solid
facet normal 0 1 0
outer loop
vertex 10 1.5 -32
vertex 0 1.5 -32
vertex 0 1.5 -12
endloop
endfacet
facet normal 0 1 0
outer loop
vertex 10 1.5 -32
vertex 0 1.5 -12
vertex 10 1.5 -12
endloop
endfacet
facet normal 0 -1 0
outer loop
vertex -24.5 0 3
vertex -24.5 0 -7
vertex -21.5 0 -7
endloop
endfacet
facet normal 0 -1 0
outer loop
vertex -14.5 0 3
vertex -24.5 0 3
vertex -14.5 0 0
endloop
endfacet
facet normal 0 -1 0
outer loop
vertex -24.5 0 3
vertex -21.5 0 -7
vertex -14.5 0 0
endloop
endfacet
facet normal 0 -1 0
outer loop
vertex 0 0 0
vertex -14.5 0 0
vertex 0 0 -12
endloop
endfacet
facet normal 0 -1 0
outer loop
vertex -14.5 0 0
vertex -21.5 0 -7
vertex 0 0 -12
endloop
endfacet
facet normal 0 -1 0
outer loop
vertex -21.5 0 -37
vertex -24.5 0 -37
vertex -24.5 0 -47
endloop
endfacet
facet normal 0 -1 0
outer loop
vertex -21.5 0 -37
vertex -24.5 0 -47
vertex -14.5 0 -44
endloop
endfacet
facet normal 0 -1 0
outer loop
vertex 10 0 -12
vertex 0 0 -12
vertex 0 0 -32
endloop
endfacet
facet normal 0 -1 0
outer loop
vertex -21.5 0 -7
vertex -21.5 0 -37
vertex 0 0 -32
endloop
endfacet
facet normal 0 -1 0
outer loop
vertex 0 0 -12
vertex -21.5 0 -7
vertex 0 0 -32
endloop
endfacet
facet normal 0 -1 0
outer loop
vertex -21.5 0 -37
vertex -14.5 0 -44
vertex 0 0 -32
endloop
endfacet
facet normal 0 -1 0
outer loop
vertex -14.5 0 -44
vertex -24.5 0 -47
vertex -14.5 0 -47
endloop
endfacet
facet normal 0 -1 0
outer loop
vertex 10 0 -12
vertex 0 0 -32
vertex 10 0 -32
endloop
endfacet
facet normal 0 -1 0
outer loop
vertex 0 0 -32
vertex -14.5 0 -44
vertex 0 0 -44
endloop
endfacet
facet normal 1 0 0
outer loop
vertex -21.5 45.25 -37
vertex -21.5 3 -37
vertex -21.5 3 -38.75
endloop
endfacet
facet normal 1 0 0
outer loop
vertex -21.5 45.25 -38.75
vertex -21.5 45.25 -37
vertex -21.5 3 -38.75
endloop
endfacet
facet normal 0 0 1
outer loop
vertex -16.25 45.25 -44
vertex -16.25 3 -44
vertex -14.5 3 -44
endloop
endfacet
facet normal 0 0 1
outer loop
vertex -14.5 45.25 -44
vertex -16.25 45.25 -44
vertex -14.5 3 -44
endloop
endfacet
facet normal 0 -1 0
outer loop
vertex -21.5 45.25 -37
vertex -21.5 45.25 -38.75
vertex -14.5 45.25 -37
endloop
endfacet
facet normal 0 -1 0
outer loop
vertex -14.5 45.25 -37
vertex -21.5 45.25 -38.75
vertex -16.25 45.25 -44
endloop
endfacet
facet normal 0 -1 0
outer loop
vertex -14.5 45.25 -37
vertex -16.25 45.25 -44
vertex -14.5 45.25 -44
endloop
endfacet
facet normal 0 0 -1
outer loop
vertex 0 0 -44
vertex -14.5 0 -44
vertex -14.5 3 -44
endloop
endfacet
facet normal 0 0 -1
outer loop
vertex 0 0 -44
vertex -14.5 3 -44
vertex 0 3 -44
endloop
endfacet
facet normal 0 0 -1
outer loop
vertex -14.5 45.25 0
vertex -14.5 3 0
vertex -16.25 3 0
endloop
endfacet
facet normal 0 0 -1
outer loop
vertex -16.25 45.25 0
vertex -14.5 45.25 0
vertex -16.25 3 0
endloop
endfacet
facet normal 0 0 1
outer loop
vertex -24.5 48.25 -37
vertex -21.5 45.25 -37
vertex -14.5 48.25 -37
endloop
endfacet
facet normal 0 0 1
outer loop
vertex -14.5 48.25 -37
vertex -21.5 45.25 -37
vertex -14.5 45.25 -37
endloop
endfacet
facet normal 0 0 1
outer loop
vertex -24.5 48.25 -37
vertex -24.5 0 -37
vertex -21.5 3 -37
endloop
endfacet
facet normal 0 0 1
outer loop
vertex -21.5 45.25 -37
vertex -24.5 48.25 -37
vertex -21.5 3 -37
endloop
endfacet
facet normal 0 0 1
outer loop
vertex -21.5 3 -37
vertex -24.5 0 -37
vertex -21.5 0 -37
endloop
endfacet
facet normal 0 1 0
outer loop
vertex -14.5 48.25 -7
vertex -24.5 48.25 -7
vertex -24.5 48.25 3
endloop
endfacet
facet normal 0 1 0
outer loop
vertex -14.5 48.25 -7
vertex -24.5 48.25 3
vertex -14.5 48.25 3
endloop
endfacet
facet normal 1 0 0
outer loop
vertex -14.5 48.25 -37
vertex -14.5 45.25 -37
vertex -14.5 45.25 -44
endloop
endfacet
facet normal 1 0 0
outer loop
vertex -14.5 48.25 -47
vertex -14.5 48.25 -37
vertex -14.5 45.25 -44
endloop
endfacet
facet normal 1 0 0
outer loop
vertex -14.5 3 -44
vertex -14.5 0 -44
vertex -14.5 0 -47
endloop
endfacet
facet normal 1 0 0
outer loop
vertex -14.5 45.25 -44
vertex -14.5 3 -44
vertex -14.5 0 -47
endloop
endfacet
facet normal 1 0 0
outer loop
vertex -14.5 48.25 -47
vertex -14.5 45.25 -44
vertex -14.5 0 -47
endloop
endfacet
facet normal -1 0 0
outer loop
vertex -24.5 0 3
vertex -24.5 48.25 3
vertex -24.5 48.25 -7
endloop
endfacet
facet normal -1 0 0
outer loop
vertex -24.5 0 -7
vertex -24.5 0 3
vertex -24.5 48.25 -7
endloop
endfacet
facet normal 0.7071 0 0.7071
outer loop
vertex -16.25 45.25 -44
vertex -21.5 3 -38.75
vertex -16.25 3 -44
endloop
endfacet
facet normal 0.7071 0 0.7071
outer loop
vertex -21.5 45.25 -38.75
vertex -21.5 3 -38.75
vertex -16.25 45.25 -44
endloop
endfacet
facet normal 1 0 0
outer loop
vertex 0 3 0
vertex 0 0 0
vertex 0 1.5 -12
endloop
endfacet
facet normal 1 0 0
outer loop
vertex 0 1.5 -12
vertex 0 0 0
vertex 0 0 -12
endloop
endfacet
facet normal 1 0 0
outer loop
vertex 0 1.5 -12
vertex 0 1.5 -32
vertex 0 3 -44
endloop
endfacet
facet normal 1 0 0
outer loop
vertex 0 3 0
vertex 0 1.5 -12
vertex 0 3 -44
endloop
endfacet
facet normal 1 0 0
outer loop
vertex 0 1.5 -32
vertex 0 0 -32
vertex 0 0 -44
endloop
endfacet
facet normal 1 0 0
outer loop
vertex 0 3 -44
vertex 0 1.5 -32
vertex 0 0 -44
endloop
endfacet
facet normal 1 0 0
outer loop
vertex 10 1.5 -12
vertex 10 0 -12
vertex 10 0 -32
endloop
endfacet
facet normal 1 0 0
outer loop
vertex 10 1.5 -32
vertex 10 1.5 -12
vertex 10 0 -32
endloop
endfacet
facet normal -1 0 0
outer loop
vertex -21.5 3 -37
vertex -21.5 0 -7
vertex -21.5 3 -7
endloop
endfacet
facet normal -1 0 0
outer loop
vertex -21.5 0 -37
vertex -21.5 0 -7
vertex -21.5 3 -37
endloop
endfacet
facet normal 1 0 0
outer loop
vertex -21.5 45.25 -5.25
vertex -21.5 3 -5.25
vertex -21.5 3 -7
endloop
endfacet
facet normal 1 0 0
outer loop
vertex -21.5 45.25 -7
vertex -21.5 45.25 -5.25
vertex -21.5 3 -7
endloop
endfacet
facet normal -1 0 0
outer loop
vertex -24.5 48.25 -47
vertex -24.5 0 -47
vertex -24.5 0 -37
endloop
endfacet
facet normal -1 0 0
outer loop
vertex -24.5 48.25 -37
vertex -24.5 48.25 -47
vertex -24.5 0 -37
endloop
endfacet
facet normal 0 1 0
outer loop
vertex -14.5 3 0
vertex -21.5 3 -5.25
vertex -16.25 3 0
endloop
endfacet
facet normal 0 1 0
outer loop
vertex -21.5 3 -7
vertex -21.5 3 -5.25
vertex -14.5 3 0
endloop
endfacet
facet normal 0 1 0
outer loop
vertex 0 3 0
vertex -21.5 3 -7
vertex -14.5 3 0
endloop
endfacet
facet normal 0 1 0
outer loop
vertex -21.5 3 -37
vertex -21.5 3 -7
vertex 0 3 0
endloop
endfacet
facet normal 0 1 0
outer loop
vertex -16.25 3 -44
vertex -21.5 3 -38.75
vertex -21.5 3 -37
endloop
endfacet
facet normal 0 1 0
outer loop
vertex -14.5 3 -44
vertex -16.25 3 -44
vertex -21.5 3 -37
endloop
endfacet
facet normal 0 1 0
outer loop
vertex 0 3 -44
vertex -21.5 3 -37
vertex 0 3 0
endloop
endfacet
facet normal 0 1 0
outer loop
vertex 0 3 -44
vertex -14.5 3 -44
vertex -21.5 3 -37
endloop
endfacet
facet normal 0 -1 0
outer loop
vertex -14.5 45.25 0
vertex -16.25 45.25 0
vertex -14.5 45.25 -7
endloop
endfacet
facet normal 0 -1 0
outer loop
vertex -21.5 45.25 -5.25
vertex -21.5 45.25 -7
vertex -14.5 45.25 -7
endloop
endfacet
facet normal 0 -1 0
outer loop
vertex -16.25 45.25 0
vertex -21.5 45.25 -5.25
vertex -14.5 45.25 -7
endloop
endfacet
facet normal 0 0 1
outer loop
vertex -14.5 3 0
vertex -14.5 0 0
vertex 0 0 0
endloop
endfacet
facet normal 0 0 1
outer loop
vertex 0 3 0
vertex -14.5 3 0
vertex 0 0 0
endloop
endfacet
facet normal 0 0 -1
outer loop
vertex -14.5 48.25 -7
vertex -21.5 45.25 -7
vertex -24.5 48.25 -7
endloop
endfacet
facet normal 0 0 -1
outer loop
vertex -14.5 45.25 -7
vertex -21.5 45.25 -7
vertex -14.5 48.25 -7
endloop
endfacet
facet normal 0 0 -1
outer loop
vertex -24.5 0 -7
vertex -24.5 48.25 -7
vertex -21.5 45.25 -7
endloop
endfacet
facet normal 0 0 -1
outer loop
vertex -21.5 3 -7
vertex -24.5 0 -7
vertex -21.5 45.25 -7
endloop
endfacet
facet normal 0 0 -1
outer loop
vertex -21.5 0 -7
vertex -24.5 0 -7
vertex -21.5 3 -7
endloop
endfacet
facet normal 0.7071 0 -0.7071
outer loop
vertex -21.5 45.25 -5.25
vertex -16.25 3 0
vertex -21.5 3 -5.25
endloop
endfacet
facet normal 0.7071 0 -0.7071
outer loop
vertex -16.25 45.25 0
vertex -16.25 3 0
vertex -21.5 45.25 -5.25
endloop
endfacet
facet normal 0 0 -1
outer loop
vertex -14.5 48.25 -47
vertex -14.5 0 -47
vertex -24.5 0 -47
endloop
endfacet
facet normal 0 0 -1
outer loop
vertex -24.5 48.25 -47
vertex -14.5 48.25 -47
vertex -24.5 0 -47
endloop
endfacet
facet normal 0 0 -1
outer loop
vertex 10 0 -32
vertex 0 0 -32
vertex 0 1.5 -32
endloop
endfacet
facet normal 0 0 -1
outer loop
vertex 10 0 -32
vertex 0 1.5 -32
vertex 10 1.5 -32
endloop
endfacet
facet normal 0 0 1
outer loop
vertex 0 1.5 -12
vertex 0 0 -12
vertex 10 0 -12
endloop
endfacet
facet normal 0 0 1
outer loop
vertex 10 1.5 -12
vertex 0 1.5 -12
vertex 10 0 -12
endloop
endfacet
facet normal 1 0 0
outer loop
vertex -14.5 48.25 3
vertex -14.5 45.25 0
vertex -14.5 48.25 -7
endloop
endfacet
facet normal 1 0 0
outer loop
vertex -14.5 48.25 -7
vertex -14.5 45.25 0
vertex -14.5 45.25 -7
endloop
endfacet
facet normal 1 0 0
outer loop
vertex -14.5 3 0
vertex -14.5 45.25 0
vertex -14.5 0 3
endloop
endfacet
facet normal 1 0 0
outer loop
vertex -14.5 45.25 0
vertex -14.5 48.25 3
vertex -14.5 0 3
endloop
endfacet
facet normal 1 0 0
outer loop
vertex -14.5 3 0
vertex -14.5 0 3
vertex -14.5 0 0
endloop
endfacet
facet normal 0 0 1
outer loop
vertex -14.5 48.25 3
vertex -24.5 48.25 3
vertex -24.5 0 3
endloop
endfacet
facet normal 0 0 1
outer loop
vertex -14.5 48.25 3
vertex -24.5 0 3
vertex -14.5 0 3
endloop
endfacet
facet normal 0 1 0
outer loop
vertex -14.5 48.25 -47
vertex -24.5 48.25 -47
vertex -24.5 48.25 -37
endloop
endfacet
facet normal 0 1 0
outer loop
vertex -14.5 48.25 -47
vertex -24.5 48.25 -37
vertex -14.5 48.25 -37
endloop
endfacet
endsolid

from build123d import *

# Parameters (mm, degrees)
SKETCH1_W           = 21.5
SKETCH1_H           = 44
BOSS_EXTRUDE1_DEPTH = 3
SKETCH1_3_W         = 10
SKETCH1_3_H         = 20
BOSS_EXTRUDE2_DEPTH = 1.5
BOSS_EXTRUDE3_DEPTH = 45.25
SKETCH2_W           = 10
SKETCH2_H           = 10
BOSS_EXTRUDE4_DEPTH = 3
CHAMFER1_SIZE       = 5.25


with BuildPart() as part:
    # Sketch1 → Boss-Extrude1 (new body)
    with BuildSketch(Plane(origin=(0, 0, 0), x_dir=(1, 0, 0), z_dir=(0, 1, 0))):
        with Locations((-10.75, 22)):
            Rectangle(SKETCH1_W, SKETCH1_H)
    extrude(amount=BOSS_EXTRUDE1_DEPTH)

    # Sketch1<3> → Boss-Extrude2 (add)
    with BuildSketch(Plane(origin=(0, 0, 0), x_dir=(1, 0, 0), z_dir=(0, 1, 0))):
        with Locations((5, 22)):
            Rectangle(SKETCH1_3_W, SKETCH1_3_H)
    extrude(amount=BOSS_EXTRUDE2_DEPTH)

    # Sketch1<4> → Boss-Extrude3 (add)
    with BuildSketch(Plane(origin=(0, 0, 0), x_dir=(1, 0, 0), z_dir=(0, 1, 0))):
        Polygon((-14.5, -3), (-14.5, 0), (-21.5, 0), (-21.5, 7), (-24.5, 7), (-24.5, -3), align=None)
        Polygon((-24.5, 37), (-21.5, 37), (-21.5, 44), (-14.5, 44), (-14.5, 47), (-24.5, 47), align=None)
    extrude(amount=BOSS_EXTRUDE3_DEPTH)

    # Sketch2 → Boss-Extrude4 (add)
    with BuildSketch(Plane(origin=(0, 45.25, 0), x_dir=(1, 0, 0), z_dir=(0, 1, 0))):
        with Locations((-19.5, 2)):
            Rectangle(SKETCH2_W, SKETCH2_H)
        with Locations((-19.5, 42)):
            Rectangle(SKETCH2_W, SKETCH2_H)
    extrude(amount=BOSS_EXTRUDE4_DEPTH)

    # Chamfer1
    chamfer1_edges = [part.edges().sort_by_distance(p)[0] for p in [
        (-21.5, 24.125, 0),
        (-21.5, 24.125, -44),
    ]]
    chamfer(chamfer1_edges, length=CHAMFER1_SIZE)


solid = part.part
